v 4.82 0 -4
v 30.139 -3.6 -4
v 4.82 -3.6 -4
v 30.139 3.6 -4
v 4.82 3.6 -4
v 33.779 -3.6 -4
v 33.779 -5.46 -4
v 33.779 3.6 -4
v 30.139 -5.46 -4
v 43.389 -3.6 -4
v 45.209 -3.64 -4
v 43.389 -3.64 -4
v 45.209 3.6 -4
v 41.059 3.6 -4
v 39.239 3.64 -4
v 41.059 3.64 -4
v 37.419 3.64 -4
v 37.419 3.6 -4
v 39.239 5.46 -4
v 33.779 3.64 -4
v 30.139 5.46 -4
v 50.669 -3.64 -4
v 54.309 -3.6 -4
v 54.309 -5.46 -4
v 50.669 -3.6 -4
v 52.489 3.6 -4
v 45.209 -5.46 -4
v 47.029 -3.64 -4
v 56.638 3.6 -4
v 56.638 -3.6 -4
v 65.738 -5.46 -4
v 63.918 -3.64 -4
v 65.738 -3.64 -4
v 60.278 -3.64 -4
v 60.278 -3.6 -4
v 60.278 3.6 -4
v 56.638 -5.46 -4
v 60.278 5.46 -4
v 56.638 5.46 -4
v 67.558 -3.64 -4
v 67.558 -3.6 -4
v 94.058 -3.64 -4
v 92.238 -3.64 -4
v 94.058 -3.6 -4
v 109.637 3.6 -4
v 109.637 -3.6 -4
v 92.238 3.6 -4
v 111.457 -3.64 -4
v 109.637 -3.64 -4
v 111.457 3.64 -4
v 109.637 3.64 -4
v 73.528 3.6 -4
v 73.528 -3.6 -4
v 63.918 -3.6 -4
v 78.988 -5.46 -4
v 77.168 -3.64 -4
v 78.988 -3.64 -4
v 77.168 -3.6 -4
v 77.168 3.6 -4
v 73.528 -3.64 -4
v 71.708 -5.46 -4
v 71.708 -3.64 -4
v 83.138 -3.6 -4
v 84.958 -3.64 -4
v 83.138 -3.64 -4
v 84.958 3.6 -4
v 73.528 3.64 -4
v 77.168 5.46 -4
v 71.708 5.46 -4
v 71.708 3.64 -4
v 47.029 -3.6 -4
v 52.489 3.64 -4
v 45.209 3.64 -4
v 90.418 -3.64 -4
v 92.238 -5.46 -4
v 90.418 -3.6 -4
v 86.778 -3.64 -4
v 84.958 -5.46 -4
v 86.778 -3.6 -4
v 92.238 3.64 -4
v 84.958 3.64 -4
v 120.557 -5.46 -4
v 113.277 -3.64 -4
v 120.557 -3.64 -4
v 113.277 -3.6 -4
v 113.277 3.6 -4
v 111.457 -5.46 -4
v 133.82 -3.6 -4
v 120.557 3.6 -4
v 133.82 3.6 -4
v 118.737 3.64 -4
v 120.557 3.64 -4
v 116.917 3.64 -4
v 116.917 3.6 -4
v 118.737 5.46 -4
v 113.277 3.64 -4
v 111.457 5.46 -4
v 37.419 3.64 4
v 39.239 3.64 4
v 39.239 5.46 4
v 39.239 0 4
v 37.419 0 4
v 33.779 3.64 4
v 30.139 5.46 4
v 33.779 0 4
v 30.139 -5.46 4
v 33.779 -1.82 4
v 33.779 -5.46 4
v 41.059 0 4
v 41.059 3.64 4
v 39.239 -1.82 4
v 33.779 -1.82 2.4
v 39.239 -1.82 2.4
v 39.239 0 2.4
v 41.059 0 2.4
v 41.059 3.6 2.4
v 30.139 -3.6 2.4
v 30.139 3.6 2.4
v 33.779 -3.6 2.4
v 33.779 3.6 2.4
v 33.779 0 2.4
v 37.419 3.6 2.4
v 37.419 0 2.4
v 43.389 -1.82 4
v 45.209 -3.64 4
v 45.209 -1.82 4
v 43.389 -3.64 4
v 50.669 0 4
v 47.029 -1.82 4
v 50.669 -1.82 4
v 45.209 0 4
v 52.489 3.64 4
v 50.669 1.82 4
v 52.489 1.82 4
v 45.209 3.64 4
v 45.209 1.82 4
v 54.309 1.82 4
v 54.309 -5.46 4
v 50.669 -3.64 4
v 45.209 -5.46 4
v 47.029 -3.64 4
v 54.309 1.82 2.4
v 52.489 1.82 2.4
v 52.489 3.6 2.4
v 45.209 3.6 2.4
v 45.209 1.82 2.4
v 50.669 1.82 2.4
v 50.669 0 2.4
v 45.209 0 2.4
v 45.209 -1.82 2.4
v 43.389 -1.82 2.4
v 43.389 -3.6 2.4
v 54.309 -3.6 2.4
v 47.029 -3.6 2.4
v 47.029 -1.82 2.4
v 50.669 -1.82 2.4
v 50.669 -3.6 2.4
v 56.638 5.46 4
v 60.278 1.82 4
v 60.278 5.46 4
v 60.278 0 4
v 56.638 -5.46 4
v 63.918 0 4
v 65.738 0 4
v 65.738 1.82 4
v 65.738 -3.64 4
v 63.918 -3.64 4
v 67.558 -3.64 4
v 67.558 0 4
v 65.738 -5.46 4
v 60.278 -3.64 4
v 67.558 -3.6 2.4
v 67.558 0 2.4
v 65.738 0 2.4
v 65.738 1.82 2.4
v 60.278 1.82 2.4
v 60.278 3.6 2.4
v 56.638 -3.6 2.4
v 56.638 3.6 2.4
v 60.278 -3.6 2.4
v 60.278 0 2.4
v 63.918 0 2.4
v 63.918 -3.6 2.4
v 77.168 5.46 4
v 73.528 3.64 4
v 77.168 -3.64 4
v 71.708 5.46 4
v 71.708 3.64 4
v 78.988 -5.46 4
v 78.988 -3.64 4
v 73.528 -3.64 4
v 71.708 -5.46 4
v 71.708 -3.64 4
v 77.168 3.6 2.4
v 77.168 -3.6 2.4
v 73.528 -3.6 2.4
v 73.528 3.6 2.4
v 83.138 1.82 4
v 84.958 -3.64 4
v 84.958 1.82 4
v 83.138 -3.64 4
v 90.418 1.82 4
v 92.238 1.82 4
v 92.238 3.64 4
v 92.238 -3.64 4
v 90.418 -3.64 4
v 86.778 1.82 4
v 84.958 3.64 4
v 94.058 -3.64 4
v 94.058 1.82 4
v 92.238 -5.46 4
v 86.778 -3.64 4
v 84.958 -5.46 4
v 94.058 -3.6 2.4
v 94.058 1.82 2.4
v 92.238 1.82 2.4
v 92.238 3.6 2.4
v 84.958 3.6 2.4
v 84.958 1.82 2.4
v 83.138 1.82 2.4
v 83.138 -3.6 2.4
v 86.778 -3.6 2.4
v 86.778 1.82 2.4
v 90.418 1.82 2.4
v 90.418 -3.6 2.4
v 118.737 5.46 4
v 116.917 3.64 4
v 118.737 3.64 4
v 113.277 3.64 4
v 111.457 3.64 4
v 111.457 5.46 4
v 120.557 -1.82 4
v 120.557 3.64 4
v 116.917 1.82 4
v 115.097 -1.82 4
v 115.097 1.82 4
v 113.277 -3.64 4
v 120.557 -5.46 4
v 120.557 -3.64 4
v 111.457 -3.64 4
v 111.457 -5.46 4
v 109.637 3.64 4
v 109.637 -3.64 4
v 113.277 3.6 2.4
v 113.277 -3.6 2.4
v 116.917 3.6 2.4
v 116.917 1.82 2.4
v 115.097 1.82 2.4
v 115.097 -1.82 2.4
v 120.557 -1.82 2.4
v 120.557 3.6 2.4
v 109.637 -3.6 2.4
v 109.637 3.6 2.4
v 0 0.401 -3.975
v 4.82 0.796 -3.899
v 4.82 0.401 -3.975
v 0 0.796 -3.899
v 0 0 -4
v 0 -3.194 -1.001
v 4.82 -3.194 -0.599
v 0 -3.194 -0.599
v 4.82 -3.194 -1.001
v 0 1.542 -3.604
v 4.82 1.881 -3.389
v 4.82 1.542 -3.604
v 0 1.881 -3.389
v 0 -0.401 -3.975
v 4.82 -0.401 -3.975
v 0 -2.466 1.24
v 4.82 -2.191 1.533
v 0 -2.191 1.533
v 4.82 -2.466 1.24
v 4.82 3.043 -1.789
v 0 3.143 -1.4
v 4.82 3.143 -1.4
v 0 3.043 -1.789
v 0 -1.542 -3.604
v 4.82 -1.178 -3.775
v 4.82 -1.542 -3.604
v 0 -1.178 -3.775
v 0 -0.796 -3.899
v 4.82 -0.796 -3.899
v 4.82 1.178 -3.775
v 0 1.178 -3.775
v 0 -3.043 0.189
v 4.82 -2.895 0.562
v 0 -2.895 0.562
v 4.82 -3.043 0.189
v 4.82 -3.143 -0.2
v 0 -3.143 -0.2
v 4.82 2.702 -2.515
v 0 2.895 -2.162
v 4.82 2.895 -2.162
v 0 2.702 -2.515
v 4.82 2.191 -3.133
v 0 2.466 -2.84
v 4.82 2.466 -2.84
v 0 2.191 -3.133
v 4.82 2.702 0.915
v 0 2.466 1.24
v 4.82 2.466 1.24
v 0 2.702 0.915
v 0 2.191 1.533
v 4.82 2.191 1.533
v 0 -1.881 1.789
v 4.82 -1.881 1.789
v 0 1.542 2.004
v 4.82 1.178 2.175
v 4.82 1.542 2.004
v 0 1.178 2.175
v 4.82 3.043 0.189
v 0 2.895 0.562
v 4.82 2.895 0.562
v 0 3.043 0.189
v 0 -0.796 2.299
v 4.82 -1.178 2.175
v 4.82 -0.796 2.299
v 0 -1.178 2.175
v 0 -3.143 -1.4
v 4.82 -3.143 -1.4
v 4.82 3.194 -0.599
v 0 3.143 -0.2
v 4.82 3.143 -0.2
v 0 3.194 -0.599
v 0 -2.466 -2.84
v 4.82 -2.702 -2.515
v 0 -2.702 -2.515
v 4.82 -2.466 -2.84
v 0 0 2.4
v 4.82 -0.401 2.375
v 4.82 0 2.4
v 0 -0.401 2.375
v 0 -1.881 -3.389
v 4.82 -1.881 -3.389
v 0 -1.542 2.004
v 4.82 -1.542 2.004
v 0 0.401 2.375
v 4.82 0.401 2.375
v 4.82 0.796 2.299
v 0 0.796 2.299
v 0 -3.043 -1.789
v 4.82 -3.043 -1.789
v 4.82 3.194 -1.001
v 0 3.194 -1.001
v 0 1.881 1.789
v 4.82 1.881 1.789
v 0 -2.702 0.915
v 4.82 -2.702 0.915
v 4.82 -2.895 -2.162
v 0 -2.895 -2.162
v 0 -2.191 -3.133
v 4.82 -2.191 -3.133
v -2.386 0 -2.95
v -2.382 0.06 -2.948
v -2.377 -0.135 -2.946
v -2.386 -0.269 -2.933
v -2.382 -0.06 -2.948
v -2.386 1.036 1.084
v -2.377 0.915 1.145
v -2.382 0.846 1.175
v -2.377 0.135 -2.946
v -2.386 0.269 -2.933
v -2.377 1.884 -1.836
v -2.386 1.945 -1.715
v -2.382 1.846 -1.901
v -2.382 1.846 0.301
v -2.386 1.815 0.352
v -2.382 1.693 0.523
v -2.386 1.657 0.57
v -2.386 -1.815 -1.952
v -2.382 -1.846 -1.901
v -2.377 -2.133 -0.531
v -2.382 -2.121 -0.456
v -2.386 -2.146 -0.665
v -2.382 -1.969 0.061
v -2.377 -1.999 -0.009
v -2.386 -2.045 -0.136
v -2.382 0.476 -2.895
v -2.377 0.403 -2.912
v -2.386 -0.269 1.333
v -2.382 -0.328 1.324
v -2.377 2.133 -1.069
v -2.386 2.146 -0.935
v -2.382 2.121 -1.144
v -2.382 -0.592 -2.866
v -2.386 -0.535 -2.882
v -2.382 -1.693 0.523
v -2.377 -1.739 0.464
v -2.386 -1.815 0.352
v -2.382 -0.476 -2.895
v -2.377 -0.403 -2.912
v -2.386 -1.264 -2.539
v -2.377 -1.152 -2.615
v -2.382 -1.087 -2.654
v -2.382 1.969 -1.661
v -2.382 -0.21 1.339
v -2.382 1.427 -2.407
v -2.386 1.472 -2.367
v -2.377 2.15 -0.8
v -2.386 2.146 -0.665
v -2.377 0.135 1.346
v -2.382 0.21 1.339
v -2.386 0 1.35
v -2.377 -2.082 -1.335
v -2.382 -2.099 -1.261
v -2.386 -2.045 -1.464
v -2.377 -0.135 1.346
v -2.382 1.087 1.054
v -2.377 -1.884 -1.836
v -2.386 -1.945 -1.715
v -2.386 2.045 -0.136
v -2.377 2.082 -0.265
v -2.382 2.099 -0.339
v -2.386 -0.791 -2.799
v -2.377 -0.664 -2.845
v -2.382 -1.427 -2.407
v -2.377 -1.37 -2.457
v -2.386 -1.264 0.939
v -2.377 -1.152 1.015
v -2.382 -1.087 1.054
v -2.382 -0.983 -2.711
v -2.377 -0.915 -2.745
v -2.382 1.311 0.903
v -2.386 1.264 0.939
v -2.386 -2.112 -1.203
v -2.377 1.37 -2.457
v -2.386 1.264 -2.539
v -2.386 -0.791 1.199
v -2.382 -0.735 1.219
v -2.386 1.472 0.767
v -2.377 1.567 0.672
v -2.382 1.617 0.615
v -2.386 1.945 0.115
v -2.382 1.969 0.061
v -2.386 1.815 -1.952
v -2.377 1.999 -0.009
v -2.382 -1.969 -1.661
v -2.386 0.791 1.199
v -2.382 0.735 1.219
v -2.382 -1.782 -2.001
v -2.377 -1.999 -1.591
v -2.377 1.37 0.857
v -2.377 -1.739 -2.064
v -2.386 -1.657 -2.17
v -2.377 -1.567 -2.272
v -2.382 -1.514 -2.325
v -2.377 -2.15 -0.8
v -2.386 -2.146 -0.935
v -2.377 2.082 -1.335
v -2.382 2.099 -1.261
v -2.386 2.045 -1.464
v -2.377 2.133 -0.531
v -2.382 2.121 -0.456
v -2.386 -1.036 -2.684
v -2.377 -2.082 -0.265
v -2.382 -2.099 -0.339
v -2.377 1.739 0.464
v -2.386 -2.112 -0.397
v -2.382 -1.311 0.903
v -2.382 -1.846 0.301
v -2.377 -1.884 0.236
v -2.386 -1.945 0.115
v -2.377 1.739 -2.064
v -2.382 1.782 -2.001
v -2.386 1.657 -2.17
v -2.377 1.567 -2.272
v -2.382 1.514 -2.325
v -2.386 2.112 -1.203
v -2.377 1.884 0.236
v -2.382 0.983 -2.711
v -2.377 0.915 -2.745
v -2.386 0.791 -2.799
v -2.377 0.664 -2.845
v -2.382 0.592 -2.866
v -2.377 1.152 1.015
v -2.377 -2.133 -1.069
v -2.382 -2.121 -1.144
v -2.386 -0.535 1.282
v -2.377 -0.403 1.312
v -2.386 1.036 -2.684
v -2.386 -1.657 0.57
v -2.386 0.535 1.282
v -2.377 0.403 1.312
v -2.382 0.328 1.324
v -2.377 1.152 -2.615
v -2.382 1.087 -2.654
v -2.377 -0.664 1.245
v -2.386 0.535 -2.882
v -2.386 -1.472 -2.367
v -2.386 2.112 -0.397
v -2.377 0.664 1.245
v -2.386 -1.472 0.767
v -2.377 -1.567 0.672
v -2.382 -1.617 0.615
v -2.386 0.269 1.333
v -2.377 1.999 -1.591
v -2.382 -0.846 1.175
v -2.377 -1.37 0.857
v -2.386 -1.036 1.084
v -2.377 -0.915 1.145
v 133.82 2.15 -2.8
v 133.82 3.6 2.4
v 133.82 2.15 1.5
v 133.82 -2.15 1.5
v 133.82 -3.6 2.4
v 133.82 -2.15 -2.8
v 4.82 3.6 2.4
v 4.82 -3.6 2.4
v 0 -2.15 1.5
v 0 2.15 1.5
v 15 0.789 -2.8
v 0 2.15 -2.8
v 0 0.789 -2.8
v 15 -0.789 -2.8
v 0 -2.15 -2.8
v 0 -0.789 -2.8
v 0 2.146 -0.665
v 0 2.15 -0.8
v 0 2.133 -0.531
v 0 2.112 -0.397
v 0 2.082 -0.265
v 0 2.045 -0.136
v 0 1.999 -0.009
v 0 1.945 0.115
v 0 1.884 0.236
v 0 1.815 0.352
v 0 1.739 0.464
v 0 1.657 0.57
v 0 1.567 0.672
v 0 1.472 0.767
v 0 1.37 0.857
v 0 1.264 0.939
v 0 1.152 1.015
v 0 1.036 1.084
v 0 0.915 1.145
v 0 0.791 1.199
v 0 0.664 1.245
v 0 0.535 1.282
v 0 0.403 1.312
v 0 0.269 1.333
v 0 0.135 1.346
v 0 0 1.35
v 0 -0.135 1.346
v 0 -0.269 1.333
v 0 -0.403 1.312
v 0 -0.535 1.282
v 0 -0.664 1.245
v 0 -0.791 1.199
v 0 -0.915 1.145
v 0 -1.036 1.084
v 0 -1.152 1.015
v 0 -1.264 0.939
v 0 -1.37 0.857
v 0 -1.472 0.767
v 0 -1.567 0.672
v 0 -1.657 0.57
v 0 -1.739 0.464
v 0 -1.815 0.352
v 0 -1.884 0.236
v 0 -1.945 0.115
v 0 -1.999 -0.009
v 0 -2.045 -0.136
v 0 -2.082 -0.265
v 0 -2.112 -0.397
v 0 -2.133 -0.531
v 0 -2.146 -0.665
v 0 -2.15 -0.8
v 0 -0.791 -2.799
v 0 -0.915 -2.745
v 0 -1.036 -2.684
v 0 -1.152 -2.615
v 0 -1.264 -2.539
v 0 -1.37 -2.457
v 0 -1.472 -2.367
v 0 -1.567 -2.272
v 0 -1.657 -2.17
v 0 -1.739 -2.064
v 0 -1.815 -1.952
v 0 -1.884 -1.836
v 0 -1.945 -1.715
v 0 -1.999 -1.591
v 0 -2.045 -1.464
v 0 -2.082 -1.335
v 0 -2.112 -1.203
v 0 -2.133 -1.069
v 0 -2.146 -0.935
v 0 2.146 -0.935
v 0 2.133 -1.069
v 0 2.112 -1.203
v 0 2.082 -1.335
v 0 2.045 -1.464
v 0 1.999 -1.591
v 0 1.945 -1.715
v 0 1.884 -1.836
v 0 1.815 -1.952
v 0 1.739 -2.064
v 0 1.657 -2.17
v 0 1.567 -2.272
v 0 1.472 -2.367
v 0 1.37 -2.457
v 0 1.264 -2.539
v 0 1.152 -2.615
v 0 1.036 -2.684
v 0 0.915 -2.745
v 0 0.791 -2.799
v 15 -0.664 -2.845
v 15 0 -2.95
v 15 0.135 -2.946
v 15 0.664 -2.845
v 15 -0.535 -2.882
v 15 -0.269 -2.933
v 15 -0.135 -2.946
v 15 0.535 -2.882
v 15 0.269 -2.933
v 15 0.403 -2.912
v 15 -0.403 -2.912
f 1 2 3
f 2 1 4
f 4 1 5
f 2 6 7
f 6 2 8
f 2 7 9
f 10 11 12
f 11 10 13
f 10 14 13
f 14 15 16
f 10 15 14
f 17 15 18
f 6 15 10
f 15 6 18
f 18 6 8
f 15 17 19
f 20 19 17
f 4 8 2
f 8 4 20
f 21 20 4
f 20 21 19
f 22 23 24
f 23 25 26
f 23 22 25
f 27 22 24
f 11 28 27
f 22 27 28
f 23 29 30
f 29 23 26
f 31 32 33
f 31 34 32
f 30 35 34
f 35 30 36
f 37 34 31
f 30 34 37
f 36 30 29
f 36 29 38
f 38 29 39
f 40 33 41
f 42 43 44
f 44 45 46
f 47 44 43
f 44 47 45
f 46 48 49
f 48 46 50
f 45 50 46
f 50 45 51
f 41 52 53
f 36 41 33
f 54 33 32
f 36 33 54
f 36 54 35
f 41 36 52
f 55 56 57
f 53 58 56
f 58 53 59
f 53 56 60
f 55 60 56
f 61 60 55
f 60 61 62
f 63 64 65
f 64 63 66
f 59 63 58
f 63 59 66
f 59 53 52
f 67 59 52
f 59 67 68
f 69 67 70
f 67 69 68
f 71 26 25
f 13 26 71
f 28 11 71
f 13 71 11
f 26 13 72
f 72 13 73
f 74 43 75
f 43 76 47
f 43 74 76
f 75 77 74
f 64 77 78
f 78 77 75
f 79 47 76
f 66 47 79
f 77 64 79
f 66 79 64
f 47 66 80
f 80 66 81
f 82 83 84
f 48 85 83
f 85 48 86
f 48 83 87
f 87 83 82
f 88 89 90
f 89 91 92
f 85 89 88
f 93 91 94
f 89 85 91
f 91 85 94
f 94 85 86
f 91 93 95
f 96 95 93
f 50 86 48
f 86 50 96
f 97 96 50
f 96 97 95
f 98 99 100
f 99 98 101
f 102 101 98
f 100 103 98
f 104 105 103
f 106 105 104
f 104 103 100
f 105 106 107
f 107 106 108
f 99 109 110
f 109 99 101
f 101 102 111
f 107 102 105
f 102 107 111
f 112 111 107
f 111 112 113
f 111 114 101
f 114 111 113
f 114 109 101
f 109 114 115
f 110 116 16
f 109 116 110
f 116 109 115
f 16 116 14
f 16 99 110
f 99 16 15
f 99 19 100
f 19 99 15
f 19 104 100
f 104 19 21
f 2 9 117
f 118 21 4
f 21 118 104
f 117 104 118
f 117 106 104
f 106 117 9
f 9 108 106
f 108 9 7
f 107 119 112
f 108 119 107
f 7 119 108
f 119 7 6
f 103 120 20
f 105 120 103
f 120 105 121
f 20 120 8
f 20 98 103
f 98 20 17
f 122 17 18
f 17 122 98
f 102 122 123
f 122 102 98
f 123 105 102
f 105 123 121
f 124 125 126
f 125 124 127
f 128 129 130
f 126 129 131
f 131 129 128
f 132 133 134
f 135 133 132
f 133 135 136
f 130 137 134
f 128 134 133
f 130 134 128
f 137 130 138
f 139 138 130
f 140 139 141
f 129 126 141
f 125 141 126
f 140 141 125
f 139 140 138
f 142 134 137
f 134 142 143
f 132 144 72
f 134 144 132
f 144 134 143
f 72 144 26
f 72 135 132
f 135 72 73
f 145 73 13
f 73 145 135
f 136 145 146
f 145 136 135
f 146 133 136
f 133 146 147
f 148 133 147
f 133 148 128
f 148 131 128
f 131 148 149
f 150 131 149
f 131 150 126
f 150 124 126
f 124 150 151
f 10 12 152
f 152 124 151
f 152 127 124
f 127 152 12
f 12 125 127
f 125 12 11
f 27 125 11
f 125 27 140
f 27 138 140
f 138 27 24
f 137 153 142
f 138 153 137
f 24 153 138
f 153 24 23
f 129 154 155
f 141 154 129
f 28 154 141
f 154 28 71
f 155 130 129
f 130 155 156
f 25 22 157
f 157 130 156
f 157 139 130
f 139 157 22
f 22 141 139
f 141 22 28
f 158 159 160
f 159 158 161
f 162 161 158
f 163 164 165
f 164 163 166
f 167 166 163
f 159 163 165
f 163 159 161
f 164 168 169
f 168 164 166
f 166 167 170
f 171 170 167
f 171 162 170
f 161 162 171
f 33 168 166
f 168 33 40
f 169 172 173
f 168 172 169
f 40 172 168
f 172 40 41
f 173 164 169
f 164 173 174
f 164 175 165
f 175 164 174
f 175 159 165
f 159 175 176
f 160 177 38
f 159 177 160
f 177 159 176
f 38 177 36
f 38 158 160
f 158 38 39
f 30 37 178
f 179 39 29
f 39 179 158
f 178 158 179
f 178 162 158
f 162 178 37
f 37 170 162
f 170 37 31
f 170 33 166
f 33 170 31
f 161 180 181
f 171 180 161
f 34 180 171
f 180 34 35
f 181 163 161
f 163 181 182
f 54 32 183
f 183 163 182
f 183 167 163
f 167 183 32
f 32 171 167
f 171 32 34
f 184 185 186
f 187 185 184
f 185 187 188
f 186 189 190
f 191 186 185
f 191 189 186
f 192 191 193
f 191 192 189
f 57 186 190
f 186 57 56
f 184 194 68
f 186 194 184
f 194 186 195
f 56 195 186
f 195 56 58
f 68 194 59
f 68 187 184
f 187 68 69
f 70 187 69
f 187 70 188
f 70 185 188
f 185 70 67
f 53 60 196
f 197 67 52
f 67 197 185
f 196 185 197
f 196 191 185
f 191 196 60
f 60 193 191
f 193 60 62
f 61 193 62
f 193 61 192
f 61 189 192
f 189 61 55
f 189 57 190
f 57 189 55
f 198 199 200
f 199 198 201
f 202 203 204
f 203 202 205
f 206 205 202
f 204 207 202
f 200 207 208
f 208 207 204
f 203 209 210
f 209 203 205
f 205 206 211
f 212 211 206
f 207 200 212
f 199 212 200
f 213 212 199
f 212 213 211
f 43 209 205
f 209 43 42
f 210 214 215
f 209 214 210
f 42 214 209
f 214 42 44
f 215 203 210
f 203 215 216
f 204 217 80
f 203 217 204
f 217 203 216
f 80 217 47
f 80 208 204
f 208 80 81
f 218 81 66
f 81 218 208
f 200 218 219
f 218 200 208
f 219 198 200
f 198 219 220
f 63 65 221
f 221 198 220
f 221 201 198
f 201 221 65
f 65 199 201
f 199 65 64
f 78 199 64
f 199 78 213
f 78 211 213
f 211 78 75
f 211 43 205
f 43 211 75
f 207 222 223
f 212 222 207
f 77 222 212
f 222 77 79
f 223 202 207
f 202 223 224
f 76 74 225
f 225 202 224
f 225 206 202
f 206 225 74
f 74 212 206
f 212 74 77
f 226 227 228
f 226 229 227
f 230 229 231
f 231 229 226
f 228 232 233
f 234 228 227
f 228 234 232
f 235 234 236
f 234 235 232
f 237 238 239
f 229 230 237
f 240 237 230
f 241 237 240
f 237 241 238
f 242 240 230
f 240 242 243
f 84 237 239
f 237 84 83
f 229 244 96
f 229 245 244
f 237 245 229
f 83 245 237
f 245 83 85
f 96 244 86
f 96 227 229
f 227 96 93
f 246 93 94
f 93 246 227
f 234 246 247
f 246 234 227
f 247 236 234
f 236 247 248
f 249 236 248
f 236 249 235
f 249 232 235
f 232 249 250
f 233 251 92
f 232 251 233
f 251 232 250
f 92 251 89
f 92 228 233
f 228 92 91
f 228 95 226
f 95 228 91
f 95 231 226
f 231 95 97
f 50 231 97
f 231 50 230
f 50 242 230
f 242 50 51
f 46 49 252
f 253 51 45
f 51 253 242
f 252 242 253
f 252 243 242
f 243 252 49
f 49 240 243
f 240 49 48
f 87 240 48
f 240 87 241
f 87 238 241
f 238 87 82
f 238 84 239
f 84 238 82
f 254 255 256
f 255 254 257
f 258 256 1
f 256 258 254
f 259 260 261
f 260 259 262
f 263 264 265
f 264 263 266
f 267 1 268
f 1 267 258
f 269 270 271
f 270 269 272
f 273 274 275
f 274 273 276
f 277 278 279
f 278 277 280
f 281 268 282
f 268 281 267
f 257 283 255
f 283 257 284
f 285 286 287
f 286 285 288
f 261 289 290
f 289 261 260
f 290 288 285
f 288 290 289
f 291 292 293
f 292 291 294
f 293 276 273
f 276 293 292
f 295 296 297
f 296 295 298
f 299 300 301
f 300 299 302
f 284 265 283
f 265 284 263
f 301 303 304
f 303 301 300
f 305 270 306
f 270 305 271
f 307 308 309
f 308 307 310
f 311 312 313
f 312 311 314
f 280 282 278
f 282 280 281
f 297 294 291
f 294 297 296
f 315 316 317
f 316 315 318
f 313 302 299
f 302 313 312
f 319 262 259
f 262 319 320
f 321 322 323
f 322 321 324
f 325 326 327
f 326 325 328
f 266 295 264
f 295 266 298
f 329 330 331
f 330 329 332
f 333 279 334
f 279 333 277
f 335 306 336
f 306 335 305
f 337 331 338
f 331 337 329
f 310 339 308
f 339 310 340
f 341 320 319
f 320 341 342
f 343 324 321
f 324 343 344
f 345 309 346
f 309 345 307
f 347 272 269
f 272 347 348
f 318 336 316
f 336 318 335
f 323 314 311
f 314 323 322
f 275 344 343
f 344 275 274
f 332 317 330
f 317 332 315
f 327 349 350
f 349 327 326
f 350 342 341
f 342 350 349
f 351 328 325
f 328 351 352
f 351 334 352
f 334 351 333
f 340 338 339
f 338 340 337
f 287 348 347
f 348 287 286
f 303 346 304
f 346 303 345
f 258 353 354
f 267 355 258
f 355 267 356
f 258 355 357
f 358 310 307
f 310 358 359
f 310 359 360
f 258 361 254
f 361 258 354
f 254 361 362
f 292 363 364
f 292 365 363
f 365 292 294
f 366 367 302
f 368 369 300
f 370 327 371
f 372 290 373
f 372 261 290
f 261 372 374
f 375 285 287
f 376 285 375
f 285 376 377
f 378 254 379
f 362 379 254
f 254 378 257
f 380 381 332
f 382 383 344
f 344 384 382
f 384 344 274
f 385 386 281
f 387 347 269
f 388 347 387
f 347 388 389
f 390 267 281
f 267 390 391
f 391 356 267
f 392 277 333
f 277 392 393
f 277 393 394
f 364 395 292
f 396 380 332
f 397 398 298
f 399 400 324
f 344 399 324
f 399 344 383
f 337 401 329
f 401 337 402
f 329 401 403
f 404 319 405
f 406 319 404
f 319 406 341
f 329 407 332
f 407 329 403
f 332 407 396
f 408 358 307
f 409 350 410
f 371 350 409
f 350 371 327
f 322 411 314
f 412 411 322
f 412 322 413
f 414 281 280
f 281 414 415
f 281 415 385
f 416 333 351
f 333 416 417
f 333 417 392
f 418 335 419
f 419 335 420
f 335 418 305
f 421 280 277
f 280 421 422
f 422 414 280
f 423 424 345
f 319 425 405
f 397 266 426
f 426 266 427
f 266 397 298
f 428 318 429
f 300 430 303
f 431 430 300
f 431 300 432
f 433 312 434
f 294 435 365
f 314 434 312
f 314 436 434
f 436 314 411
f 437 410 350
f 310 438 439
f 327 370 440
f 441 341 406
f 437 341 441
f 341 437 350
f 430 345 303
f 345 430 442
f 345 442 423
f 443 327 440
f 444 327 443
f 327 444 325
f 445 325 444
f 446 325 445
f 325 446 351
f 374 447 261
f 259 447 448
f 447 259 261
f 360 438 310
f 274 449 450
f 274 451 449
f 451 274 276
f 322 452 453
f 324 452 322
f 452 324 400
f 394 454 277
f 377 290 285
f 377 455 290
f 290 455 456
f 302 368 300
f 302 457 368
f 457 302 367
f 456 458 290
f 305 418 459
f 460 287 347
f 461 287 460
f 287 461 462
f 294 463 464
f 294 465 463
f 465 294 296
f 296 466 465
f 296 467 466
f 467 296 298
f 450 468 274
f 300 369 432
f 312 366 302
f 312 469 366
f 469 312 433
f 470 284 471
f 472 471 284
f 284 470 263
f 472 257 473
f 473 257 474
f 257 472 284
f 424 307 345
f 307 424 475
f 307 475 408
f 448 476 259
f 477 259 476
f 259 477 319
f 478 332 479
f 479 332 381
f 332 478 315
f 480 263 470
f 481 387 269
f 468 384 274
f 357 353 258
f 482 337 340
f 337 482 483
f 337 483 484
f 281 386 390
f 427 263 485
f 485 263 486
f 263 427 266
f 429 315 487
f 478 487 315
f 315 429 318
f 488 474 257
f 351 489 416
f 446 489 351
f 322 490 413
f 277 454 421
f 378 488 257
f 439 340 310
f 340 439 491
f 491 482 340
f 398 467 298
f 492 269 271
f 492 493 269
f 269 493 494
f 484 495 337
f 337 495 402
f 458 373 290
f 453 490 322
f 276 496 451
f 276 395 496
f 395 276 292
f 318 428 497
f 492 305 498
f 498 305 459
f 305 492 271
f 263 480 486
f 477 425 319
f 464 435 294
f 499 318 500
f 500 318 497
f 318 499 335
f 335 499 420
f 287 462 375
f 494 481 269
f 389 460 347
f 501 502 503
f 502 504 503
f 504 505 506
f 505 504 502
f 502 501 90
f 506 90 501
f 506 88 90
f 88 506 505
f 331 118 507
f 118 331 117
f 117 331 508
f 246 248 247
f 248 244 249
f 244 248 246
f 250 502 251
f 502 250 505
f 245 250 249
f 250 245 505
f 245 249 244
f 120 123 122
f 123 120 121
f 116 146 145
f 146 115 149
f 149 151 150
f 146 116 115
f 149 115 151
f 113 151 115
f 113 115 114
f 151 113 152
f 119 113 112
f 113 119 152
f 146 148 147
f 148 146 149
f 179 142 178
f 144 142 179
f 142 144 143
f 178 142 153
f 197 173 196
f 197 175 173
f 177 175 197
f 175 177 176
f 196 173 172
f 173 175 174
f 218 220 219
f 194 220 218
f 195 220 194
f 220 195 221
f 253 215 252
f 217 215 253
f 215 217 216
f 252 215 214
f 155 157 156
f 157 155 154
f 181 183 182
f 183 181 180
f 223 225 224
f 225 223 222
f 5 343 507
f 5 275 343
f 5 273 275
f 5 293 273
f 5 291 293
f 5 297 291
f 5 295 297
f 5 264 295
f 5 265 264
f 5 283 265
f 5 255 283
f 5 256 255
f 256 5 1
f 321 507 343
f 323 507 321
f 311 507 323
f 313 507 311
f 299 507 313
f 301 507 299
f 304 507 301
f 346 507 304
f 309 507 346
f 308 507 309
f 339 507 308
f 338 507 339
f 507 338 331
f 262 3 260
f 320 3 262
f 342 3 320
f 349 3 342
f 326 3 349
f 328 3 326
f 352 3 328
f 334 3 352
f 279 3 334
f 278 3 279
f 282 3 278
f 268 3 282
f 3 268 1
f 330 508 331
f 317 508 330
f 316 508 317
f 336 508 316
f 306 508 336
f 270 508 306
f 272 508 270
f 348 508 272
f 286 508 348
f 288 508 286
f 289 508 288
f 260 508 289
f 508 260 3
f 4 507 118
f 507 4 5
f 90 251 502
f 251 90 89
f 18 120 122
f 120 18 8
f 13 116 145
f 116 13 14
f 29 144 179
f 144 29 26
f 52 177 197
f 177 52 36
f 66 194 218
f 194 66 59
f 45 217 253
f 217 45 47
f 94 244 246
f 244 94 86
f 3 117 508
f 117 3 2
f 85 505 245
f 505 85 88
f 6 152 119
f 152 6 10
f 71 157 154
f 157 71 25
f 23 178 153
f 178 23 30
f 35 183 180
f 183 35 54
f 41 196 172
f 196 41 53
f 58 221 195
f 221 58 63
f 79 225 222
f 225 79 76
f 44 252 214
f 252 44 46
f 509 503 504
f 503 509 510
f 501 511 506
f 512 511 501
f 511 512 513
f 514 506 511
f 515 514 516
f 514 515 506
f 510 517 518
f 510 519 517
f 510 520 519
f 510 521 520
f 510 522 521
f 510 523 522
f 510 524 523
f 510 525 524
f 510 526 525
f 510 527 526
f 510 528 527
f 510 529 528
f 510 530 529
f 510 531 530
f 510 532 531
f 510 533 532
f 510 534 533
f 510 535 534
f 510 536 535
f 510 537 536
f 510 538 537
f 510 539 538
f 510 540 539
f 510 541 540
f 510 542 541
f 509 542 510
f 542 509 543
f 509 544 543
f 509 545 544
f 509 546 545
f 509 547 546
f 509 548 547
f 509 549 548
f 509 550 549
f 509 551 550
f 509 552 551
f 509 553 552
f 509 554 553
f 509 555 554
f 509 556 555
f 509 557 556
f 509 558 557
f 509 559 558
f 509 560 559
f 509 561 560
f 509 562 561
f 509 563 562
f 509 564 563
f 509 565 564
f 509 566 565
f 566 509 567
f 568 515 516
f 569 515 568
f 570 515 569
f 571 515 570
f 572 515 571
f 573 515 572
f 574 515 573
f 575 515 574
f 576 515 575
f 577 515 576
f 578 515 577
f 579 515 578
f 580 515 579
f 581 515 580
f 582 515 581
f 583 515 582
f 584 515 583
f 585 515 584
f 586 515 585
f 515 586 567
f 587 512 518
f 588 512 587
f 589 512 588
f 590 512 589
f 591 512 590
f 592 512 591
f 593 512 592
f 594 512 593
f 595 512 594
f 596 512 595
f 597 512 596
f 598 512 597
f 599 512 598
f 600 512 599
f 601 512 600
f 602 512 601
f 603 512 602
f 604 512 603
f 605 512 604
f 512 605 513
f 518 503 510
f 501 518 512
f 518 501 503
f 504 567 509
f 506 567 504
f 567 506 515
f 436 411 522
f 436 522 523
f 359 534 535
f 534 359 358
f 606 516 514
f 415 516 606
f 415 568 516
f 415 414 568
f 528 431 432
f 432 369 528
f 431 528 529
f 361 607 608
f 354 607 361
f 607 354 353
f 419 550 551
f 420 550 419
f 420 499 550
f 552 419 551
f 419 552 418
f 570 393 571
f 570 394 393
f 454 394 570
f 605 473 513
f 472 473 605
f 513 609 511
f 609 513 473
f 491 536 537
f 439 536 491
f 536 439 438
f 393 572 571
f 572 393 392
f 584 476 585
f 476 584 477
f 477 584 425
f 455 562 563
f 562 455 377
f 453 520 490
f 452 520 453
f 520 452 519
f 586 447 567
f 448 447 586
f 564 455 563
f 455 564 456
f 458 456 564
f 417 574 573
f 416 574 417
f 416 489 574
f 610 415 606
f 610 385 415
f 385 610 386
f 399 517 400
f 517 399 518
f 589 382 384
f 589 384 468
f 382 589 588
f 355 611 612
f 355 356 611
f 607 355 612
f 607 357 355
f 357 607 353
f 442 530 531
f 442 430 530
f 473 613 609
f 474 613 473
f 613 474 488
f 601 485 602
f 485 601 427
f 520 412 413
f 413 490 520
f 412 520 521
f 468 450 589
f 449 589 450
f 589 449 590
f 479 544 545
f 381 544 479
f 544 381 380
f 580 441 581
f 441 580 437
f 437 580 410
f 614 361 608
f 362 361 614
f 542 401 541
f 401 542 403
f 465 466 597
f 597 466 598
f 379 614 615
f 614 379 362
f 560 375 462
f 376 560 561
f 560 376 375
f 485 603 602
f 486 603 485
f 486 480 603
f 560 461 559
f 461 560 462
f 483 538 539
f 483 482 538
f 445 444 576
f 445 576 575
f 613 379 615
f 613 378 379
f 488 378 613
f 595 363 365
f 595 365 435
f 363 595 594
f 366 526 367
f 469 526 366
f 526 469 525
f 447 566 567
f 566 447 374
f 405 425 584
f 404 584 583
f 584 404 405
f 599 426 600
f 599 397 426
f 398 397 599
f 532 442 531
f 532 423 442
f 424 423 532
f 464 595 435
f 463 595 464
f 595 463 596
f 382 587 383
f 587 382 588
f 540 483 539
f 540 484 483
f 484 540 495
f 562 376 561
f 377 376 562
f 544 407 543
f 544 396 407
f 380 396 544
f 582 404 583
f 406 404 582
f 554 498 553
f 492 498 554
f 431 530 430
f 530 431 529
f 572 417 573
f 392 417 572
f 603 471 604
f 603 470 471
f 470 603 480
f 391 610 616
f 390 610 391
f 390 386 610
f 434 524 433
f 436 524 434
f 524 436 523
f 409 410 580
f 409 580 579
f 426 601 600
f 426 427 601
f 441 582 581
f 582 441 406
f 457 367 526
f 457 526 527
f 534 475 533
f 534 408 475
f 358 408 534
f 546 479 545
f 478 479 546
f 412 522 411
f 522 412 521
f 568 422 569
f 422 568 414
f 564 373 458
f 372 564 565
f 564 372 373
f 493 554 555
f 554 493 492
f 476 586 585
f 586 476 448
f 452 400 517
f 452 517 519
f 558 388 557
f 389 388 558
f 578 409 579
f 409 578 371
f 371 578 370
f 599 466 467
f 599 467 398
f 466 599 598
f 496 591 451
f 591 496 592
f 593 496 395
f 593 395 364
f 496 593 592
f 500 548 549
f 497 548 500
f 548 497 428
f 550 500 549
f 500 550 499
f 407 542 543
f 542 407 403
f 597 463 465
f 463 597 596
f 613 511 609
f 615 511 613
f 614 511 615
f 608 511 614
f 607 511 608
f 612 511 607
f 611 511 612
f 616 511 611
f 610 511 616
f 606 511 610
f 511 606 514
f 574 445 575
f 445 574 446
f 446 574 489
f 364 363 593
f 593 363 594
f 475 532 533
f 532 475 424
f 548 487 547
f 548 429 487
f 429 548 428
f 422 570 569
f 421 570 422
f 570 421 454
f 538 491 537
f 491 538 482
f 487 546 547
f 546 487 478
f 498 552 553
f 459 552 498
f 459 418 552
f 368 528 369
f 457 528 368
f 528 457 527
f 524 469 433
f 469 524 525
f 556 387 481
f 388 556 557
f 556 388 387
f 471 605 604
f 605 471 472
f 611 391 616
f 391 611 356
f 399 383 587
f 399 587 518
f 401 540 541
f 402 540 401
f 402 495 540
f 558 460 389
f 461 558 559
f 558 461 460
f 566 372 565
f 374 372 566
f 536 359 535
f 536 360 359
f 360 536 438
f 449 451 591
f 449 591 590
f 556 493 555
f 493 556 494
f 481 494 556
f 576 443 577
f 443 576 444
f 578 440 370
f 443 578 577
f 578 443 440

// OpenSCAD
use <MCAD/fonts.scad>

// Word to display on the pen
//word = "Gonzalo";

// Scale multipler for font size
//font_scale = 1.5	;

// Character Spacing (for some reason this value is buggy using the customizer)
//font_spacing = 0.81; 

// The diameter of end hole
pen_inner_diameter = 4.3 *1;
pen_inner_radius = pen_inner_diameter / 2;

// length of the entire pen
//pen_length = 80; //

// Overal thickness of the pen
pen_thickness = 8*1;


/////////////////////////////////////////
//////////////////////////////////



module penword(word, font_scale, font_spacing, pen_length )
{

thisFont=8bit_polyfont();
x_shift=thisFont[0][0] * font_spacing;
y_shift=thisFont[0][1];

	theseIndicies=search(word,thisFont[2],1,1);
	wordlength = (len(theseIndicies))* x_shift;
	
	difference() {

		union() {

// Create the Text //
			scale([font_scale,font_scale,1]){
			for( j=[0:(len(theseIndicies)-1)] ) 
				translate([ j*x_shift + 1, -y_shift/2 ,-pen_thickness/2]) 
				{
					linear_extrude(height=pen_thickness) polygon(points=thisFont[2][theseIndicies[j]][6][0],paths=thisFont[2][theseIndicies[j]][6][1]);
				}
			}
			
// Main body
			translate([1*font_scale+3	,-y_shift*.45,-pen_thickness/2]) cube([pen_length - 3,y_shift * 0.9,pen_thickness * 0.8]);

// Pen Tip
			rotate(a=[0,90,0]) 
				{
					translate([pen_thickness*0.1,0,0	])	cylinder(h = 5, r = pen_thickness*.4, $fn=50);
					translate([pen_thickness*0.1,0,-5	])	cylinder(h = 5, r1 = 1, r2 = pen_thickness*.4, $fn=50);
				}			
		}
// Cut outs
			translate([0,-pen_inner_diameter/2,-pen_thickness/2+pen_thickness*.15]) cube([pen_length + 20,pen_inner_diameter,pen_inner_diameter]);
			rotate(a=[0,90,0])translate([pen_thickness*.1,0,-15])	cylinder(h = 30, r = pen_inner_radius, $fn=100);
	}
}

//translate([0, 20,0]) penword("  Belen", 1.5, 0.81, 80);
//translate([0, 40,0])penword("  Javi", 1.5, 0.81, 80);
//translate([0, 60,0])penword("Gonzalo", 1.5, 0.81, 80);
//penword(" Gonzalo", 1.5, 0.81, 80);
 penword("  Pablo @", 1.82, 0.91, 132);
//translate([0, -40,0])penword("  Olga", 1.5, 0.81, 80);
//translate([0, -60,0])penword(" Oscar", 1.5, 0.81, 80);
